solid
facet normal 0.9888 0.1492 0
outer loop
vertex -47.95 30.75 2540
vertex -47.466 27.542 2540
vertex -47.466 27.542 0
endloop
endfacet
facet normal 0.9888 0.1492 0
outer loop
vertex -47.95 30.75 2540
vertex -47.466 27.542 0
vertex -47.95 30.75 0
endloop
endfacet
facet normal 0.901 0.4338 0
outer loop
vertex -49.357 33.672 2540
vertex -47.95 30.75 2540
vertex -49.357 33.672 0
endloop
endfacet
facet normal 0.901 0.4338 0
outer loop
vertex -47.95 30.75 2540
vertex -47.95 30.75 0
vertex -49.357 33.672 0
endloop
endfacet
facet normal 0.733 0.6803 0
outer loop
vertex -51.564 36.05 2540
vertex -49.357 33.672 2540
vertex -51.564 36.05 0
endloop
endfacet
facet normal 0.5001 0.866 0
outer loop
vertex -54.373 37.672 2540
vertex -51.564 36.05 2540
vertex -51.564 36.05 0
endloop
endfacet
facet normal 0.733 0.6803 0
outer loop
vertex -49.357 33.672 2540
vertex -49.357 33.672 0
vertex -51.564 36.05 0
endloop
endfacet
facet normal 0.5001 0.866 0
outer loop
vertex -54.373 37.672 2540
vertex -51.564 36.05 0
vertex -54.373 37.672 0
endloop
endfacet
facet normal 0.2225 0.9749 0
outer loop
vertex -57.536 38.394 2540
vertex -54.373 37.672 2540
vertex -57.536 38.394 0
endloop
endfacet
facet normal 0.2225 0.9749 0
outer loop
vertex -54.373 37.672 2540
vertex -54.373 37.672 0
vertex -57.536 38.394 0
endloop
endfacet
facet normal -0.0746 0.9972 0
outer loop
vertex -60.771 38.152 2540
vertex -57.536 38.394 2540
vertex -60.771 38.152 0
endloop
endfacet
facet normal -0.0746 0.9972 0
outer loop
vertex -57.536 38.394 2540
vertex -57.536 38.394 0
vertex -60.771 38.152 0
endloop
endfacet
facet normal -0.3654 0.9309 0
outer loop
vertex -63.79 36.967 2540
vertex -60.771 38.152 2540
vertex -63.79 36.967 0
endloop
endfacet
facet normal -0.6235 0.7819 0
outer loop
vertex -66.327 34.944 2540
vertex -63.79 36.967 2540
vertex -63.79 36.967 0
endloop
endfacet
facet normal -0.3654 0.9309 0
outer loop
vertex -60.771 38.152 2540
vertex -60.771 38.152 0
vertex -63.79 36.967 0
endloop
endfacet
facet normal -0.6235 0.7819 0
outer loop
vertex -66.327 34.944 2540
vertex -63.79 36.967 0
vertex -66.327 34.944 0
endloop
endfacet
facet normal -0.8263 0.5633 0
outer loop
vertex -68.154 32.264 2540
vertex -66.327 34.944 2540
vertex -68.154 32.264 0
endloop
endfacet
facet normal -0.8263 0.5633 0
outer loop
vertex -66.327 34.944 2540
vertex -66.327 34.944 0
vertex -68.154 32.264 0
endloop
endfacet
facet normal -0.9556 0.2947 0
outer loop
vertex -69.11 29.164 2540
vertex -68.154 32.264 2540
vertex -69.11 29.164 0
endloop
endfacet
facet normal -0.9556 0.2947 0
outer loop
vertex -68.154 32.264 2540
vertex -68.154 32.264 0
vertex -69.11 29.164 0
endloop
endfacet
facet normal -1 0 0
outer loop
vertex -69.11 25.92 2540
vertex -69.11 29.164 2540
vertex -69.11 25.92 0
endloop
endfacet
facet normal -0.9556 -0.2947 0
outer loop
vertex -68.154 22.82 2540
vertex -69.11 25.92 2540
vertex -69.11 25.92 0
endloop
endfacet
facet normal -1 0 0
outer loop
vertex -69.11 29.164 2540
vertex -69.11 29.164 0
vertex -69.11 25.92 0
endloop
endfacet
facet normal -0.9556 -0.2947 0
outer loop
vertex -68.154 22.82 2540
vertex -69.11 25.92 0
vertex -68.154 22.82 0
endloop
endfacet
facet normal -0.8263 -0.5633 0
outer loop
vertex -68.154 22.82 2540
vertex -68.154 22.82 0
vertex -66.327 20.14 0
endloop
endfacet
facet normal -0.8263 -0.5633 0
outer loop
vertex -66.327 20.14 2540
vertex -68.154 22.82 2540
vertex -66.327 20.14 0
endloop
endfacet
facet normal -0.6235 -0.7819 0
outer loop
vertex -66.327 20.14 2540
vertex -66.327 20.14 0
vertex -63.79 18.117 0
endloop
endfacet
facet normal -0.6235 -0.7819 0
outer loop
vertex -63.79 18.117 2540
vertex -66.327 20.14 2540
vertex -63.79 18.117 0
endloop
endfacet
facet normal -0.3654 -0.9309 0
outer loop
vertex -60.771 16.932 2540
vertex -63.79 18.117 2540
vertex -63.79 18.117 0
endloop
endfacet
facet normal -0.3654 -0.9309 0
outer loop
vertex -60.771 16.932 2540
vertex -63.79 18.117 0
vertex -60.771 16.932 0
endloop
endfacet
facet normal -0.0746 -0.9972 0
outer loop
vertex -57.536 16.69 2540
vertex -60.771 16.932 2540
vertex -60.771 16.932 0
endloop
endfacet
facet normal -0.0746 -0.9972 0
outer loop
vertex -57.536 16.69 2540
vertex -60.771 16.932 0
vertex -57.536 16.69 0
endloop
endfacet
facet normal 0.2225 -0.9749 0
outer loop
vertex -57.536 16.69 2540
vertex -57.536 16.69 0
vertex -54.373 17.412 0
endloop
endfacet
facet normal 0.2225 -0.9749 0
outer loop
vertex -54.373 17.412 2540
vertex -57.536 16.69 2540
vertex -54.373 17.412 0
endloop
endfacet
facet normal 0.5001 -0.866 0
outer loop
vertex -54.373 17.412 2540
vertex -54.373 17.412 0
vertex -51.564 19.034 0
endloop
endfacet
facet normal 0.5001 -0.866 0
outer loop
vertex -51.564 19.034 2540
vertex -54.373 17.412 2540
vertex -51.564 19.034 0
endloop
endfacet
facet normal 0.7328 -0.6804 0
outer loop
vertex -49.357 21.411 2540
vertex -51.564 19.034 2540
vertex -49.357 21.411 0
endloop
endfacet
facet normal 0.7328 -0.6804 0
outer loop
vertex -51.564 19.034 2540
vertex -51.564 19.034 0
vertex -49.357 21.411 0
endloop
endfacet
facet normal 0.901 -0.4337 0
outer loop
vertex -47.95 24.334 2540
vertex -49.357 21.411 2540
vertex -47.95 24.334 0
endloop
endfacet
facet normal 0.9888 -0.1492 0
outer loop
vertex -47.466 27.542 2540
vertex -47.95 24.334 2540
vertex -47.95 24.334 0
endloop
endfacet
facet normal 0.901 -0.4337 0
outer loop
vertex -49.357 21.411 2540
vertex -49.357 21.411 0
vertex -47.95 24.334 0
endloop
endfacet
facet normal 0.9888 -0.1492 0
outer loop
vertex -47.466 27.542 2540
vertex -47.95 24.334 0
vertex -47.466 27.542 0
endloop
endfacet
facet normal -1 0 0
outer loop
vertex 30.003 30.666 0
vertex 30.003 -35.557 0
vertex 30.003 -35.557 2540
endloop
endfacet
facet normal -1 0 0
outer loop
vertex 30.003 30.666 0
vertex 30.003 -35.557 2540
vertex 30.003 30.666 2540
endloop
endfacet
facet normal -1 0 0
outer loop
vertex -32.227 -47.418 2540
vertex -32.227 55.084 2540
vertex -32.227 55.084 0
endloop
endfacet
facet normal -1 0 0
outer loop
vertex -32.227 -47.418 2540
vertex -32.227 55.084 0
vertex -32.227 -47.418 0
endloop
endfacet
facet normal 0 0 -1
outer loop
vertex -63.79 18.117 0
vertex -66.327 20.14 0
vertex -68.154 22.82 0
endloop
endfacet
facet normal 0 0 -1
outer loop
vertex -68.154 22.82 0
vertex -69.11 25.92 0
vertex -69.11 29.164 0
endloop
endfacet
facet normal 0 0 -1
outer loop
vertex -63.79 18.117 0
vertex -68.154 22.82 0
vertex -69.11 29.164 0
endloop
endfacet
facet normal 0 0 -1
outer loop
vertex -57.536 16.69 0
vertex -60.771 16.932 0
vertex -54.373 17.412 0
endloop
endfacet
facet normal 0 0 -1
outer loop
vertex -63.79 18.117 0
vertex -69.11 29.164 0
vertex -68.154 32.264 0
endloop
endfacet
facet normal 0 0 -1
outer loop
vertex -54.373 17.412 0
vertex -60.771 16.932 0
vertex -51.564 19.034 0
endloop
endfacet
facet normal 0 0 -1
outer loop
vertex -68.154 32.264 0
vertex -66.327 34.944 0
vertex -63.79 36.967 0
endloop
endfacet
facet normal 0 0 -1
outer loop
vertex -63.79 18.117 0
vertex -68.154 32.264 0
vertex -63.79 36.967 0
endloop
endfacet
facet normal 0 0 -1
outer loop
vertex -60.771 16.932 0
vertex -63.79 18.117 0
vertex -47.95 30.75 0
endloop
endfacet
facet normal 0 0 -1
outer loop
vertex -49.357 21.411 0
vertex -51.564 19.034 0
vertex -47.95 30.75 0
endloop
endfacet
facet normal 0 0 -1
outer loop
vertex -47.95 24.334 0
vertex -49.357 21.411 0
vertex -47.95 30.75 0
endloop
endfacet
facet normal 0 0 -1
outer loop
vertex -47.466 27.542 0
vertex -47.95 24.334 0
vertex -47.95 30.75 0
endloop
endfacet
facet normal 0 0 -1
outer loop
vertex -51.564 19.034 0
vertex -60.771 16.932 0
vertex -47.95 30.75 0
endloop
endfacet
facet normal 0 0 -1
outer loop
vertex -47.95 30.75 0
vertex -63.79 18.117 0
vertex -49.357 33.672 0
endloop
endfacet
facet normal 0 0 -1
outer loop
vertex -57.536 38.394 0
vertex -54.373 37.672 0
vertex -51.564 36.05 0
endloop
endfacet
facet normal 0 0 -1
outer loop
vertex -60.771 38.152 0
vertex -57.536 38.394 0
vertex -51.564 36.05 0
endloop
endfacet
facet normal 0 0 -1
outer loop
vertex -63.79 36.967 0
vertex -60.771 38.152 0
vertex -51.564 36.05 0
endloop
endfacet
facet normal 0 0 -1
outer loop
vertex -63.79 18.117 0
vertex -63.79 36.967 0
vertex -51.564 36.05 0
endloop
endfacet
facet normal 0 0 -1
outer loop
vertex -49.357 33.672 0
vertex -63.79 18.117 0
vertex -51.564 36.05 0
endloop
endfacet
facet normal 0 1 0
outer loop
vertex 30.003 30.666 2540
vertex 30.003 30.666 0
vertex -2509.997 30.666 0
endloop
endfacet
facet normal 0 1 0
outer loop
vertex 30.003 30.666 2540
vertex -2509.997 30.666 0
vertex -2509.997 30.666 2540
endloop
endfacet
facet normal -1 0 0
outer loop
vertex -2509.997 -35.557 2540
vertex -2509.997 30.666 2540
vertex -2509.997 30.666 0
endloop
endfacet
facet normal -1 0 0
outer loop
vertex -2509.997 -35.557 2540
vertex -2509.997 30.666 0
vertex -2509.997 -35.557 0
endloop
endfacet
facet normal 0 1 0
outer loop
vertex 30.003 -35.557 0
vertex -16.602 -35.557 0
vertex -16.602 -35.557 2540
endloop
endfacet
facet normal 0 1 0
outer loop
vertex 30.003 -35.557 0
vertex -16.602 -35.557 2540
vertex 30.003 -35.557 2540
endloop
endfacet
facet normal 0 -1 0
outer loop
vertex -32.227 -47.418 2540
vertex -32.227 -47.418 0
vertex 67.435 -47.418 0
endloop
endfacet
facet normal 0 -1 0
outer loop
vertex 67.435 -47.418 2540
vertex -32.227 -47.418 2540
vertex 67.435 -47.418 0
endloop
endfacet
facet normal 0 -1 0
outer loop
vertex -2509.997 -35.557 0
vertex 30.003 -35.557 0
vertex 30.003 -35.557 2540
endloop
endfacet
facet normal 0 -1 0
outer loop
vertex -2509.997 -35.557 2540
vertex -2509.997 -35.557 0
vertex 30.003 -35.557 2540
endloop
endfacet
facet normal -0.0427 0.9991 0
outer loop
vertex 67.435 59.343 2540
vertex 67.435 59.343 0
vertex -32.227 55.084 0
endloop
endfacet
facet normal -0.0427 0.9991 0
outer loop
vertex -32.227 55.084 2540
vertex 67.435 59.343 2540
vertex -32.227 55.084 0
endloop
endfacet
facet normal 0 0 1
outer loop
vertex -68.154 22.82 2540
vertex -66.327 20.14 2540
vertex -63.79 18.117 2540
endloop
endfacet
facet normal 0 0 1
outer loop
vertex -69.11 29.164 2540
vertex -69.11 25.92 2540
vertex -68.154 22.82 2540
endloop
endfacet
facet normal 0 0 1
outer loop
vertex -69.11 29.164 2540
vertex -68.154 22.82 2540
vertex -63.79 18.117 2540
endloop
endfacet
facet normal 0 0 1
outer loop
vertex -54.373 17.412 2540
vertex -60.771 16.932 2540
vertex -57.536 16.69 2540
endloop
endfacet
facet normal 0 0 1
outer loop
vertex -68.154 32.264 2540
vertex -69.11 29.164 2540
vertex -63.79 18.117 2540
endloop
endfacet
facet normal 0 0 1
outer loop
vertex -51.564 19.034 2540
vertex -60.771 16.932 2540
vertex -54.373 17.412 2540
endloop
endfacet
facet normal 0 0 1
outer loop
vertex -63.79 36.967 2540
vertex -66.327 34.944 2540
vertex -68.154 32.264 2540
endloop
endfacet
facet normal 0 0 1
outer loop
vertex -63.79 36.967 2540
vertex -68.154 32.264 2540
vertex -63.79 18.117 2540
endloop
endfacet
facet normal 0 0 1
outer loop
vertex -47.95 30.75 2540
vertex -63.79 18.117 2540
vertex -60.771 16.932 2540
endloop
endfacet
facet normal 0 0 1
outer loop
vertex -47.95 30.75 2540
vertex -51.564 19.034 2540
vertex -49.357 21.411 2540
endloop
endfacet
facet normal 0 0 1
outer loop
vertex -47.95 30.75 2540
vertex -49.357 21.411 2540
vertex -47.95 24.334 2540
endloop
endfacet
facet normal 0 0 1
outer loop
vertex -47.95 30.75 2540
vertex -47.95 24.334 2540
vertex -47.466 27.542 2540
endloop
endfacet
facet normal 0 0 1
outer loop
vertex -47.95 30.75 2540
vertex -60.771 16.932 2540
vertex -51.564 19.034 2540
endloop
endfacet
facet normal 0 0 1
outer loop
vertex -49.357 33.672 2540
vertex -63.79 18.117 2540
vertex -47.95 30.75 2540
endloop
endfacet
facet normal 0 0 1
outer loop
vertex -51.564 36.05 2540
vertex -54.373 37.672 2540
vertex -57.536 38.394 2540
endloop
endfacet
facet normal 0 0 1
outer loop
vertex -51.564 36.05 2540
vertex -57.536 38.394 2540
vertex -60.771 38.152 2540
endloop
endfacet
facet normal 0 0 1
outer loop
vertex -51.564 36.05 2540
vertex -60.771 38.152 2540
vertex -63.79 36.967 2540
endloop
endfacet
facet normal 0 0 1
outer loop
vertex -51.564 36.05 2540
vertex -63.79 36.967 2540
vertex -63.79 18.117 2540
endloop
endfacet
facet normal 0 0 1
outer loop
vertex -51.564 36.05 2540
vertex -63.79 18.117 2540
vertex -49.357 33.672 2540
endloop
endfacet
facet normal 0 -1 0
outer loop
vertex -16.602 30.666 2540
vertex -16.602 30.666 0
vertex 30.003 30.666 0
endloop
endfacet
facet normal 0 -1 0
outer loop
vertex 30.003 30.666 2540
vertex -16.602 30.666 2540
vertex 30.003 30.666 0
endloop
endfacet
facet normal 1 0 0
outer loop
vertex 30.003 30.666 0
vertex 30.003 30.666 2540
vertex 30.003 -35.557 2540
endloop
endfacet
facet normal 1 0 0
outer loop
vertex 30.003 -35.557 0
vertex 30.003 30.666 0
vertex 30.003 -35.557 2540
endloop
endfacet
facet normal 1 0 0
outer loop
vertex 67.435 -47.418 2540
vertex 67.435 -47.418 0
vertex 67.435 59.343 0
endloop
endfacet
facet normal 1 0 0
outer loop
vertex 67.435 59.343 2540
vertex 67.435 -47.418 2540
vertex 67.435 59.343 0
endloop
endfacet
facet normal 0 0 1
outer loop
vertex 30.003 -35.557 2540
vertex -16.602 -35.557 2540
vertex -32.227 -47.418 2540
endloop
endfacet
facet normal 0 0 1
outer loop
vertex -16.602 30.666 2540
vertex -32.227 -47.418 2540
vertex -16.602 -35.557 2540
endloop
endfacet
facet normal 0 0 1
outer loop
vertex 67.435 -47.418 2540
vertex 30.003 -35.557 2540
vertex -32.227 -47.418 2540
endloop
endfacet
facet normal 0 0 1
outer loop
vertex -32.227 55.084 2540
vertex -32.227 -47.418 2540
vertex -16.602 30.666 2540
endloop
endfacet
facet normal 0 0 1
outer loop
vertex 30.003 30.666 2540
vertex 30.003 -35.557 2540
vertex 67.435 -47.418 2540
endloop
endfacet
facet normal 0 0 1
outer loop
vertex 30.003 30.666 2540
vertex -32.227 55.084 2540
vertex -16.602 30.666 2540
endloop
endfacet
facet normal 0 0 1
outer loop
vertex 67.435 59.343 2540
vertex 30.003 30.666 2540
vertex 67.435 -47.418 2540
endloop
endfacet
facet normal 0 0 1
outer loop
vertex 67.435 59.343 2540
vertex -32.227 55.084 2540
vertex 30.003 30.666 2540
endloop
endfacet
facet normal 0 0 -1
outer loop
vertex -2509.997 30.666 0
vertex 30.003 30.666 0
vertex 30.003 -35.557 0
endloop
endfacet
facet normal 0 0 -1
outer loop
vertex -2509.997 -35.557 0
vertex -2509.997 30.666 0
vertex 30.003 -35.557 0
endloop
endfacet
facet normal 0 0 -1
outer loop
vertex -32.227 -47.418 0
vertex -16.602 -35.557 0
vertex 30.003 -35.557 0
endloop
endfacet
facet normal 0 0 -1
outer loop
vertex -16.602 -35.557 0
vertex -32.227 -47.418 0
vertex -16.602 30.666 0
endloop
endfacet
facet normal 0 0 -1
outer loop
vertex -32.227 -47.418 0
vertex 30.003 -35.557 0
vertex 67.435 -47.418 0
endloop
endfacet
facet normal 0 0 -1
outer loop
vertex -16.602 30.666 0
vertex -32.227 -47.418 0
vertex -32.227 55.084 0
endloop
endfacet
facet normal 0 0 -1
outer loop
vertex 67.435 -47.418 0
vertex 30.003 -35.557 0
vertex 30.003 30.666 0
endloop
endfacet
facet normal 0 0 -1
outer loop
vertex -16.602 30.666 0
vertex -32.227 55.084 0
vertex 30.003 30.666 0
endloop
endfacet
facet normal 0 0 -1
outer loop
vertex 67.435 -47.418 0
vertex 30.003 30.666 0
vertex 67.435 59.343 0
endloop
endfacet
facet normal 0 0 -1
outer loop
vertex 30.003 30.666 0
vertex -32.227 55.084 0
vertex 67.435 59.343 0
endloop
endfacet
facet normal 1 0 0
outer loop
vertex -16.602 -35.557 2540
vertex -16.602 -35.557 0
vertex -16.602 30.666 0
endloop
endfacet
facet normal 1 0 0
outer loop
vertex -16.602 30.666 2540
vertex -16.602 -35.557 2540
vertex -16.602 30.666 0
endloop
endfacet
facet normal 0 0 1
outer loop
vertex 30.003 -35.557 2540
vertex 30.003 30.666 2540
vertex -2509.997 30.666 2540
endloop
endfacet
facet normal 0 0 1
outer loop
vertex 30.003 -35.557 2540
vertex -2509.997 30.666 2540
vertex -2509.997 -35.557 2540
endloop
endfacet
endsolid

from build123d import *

# Parameters (mm, degrees)
F0_W      = 46.604457
F0_H      = 66.222696
F0_R      = 10.88261
F1_DEPTH  = 2540
F1_FACE_W = 66.222696
F1_FACE_H = 2540
F2_DEPTH  = 2540


with BuildPart() as f1:
    # F0 (on Top) → F1 (new body)
    with BuildSketch(Plane.XY):
        Polygon((67.435063, 59.342843), (-32.226857, 55.083789), (-32.226857, -47.417503), (67.435063, -47.417503), align=None)
        with Locations((6.700696, -2.445211)):
            Rectangle(F0_W, F0_H, mode=Mode.SUBTRACT)
        with Locations((-58.349073, 27.541891)):
            Circle(F0_R)
    extrude(amount=F1_DEPTH)


with BuildPart() as f2:
    # F1_face (on face) → F2 (new body)
    with BuildSketch(Plane(origin=(30.002924, -2.445211, 1270), x_dir=(0, -1, 0), z_dir=(-1, 0, 0))):
        Rectangle(F1_FACE_W, F1_FACE_H)
    extrude(amount=F2_DEPTH)


solid = Compound([f1.part, f2.part])
